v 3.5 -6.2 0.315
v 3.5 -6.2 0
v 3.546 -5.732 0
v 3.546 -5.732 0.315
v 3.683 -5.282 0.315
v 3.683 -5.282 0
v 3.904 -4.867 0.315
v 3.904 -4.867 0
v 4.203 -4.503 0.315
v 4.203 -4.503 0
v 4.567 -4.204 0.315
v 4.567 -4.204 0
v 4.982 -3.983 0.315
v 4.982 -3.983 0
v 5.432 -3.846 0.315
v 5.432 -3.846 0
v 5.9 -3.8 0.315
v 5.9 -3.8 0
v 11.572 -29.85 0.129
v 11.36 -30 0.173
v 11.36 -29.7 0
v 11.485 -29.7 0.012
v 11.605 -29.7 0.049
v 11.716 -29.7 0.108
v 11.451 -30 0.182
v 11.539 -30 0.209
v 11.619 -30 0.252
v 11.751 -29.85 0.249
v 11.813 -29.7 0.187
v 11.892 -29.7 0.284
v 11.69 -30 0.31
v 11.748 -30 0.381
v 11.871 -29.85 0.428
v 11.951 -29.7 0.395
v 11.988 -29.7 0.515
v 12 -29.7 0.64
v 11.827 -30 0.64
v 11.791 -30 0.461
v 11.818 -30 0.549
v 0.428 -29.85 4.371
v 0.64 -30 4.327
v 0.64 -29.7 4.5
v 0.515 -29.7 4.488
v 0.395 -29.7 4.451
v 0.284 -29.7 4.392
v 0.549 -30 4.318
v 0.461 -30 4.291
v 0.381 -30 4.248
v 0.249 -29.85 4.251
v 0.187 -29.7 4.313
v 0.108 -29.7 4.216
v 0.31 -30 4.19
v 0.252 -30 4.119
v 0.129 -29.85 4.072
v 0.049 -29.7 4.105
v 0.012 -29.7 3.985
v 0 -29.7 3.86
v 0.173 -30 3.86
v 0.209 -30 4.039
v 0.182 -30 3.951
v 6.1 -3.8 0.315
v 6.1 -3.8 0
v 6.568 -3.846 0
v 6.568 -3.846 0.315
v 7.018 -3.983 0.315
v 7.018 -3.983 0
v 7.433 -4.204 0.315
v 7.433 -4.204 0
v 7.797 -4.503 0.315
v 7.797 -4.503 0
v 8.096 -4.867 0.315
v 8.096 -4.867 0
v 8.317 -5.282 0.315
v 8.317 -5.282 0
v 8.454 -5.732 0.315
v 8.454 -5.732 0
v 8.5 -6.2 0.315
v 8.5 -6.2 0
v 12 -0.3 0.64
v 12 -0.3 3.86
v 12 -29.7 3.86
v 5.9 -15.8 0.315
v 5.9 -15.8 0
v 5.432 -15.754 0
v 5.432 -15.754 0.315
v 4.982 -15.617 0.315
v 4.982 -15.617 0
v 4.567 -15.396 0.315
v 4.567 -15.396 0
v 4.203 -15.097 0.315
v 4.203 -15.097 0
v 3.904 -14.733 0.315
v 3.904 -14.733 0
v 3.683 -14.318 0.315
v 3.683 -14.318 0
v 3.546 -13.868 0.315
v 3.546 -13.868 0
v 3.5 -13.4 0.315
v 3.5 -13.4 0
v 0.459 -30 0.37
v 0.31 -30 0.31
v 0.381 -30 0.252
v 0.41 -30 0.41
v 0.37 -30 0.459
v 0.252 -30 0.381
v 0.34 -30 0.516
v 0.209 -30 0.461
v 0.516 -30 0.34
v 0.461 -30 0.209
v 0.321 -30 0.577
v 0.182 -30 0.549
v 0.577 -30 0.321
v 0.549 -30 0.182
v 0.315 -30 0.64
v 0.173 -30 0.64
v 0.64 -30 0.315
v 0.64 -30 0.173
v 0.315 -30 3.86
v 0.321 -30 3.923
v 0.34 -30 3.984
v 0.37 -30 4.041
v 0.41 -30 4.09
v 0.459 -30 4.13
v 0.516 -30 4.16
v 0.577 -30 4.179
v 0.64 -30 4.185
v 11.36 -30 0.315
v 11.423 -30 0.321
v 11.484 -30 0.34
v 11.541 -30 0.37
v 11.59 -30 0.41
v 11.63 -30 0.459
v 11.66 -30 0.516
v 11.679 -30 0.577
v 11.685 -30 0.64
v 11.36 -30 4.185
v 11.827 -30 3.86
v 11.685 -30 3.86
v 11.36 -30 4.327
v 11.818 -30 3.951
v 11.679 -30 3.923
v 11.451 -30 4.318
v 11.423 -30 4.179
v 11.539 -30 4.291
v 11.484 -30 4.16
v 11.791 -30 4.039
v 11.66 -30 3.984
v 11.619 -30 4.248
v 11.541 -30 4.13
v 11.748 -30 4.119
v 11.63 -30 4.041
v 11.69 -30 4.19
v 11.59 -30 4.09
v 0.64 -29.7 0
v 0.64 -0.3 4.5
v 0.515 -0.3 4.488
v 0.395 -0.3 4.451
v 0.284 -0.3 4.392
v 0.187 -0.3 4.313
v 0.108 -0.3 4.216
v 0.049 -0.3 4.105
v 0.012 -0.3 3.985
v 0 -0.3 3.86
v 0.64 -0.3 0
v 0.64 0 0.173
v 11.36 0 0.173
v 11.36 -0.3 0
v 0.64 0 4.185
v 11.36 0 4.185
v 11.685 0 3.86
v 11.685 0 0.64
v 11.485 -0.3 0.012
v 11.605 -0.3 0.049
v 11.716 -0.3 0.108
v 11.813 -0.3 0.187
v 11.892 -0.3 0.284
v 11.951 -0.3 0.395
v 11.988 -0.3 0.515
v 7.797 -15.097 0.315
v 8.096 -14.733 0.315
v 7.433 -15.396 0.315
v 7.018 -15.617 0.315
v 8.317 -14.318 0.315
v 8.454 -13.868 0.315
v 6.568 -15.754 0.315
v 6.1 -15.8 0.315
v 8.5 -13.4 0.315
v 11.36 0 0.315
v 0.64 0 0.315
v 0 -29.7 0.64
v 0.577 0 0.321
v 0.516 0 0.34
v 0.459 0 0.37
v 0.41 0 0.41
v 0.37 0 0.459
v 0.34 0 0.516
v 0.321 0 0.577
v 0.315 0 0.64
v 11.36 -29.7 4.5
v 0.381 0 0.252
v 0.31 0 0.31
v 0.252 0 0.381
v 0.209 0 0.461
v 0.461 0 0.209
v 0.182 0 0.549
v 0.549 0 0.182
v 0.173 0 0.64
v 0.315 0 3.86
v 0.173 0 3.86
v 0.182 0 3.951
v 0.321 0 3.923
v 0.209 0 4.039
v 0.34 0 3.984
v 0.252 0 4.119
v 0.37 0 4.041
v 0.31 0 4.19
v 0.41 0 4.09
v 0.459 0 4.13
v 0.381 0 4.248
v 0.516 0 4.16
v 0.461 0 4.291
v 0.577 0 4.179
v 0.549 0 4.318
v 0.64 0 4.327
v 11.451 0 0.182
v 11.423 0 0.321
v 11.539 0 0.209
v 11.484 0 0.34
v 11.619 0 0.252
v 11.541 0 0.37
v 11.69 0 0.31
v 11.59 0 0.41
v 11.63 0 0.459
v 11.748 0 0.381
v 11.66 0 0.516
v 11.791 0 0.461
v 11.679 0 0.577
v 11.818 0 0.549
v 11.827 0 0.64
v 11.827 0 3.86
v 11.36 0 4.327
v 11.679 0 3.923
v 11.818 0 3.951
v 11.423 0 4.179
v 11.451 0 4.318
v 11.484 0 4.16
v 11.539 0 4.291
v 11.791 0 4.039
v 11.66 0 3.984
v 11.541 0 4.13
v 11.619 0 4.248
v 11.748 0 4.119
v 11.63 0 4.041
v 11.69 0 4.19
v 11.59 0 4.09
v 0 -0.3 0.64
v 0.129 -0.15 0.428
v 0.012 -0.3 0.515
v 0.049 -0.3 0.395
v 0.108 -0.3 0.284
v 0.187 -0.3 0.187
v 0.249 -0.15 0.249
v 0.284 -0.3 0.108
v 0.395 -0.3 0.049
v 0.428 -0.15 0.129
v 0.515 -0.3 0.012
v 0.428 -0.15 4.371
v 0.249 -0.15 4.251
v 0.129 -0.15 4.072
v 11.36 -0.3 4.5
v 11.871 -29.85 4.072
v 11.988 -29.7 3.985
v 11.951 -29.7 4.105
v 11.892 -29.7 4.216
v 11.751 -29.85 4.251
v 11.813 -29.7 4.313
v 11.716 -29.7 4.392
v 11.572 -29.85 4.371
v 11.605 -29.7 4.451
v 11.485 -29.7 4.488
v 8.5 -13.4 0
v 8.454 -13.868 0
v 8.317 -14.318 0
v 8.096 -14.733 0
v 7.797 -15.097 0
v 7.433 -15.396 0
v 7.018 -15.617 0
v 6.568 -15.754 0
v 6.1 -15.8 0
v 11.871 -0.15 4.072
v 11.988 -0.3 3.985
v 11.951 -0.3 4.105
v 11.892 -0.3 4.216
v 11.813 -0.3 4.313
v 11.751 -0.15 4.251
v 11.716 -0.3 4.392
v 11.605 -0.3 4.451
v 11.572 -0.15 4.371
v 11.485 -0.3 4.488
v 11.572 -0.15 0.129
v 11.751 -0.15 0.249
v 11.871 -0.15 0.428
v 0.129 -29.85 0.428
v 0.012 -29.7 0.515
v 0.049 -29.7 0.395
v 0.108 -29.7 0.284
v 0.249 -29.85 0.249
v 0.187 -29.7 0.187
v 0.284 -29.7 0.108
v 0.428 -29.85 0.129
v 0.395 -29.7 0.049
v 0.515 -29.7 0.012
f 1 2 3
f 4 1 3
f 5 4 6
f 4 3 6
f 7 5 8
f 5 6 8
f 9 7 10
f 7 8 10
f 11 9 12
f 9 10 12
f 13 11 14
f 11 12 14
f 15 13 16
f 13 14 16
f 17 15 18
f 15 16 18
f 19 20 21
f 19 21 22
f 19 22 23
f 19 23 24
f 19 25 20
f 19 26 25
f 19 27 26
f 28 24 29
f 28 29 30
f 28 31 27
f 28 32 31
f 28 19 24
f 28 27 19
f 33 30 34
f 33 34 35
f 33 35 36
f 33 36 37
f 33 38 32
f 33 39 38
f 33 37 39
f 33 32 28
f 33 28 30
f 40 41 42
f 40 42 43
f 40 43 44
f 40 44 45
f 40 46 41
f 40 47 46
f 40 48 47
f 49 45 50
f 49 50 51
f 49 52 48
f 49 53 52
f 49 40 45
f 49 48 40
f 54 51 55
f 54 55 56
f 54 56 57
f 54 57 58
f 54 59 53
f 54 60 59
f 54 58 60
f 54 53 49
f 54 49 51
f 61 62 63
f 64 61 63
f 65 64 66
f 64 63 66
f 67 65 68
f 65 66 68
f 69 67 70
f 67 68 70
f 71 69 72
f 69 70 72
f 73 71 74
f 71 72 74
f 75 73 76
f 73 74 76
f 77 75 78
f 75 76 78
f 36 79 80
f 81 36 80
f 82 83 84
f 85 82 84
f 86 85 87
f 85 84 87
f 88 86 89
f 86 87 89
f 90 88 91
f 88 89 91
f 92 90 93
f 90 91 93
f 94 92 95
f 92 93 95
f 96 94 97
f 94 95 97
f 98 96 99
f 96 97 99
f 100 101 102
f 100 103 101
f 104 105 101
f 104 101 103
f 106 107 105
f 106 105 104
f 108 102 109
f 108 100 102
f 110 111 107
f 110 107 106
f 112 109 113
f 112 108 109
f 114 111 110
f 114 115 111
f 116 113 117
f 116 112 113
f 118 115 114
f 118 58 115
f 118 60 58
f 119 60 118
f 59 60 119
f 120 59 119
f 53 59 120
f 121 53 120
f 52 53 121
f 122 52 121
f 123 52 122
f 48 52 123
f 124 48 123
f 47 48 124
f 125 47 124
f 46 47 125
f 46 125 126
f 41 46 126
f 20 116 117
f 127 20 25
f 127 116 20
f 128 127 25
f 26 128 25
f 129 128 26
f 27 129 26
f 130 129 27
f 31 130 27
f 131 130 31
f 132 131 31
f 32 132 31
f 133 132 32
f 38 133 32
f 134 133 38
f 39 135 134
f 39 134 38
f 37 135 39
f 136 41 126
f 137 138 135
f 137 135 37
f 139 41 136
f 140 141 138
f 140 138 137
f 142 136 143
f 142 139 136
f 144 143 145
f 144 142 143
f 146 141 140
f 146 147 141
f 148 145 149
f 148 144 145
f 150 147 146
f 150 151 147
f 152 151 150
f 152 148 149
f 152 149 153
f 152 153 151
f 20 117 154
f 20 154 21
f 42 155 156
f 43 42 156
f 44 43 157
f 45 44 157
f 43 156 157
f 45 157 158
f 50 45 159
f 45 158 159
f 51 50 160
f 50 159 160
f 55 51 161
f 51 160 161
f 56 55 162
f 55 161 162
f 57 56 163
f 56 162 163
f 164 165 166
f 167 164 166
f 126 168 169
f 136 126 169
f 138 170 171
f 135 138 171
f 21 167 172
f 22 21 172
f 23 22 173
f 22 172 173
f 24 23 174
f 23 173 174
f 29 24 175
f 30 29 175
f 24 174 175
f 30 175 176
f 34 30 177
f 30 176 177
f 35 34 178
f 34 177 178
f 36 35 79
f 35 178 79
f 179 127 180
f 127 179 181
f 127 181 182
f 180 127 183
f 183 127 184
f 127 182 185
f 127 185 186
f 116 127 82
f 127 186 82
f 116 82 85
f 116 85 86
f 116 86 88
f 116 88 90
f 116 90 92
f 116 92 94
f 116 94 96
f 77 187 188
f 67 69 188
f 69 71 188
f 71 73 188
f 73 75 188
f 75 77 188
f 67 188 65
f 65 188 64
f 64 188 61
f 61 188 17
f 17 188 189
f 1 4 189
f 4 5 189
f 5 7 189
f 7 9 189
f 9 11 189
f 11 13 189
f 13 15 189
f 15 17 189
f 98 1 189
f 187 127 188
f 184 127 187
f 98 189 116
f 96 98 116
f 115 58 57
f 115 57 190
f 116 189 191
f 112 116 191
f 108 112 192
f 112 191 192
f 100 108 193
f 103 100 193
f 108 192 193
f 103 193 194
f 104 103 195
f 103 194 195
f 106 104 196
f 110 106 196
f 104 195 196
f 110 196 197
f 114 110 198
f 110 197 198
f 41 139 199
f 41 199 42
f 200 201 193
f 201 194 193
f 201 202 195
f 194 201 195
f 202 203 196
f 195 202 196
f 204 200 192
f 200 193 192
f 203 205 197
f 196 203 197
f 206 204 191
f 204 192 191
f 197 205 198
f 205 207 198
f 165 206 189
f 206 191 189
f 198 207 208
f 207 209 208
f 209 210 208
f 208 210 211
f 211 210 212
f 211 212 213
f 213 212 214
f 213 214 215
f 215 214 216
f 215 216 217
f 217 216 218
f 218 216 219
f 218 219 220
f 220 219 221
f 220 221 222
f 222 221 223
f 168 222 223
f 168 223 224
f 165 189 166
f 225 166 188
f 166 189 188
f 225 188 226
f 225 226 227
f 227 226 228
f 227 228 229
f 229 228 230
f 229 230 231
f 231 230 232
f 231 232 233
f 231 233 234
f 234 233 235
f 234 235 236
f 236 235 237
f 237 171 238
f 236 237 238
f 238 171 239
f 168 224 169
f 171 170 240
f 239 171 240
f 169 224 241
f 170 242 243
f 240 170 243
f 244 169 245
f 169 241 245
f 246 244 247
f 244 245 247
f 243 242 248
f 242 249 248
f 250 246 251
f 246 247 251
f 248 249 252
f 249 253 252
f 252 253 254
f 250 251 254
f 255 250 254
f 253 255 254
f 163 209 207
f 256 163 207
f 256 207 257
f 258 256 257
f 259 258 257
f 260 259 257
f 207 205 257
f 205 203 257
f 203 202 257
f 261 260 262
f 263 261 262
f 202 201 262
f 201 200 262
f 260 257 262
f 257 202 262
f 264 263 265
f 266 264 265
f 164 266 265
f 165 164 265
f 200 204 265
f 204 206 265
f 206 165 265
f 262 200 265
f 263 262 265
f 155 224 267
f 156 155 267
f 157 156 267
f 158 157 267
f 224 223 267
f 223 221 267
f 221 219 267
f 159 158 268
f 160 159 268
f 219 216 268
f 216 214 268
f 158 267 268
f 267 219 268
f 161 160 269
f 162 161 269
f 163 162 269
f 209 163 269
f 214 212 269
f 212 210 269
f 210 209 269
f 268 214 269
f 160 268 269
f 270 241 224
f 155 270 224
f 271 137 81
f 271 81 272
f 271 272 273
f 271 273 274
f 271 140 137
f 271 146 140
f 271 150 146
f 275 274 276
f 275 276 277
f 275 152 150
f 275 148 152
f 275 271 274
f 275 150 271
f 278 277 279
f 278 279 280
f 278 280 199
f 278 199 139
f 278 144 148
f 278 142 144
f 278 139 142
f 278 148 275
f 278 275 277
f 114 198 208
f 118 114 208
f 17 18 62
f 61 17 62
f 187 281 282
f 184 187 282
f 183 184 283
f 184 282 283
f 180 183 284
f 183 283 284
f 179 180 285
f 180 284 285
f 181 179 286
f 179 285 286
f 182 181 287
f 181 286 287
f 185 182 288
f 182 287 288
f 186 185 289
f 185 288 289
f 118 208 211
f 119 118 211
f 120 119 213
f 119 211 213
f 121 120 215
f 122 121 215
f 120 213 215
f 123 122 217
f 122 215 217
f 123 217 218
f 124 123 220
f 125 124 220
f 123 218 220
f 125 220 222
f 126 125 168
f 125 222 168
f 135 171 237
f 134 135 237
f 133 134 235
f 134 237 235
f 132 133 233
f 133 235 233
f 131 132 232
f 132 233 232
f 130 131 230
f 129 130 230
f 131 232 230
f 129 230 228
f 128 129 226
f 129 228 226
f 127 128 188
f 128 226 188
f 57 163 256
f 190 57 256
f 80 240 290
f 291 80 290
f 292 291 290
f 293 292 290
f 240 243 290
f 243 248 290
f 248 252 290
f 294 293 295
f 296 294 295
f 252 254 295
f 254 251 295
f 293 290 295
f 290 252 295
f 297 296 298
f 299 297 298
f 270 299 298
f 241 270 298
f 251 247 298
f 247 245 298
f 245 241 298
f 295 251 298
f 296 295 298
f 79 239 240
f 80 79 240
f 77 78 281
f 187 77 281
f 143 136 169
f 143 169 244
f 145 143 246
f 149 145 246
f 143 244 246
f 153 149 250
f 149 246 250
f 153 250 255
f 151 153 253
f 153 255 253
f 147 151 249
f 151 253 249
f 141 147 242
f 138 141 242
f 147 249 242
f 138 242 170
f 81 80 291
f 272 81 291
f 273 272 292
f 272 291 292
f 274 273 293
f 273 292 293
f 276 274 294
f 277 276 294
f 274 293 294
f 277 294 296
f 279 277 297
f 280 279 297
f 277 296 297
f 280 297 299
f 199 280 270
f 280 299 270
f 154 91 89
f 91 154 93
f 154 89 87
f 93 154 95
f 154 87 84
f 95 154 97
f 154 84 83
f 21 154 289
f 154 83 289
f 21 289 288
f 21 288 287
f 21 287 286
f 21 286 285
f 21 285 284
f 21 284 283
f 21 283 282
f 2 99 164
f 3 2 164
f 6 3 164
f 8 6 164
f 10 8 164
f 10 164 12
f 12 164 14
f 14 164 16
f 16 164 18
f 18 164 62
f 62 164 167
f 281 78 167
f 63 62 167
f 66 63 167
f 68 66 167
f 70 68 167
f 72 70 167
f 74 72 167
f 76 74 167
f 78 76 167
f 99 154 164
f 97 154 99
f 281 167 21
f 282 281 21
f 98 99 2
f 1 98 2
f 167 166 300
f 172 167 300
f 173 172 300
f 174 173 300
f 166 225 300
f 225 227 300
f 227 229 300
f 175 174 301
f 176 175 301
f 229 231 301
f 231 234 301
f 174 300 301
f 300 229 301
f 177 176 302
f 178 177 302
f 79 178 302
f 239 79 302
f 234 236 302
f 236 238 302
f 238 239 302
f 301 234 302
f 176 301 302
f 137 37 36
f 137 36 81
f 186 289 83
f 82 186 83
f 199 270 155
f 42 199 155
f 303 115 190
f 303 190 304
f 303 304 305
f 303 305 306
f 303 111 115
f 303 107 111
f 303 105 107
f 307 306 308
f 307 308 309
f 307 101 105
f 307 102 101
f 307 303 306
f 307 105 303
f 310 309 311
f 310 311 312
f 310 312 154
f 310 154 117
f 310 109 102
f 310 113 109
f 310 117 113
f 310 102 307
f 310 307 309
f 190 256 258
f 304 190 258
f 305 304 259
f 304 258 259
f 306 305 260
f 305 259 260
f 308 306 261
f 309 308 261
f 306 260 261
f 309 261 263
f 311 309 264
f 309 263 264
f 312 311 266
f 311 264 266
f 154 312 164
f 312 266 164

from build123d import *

# Parameters (mm, degrees)
F1_DEPTH = 30
F3_DEPTH = 0.315
F4_SIZE2 = 0.173205
F4_SIZE  = 0.3


with BuildPart() as f1:
    # F0 (on Front) → F1 (new body)
    with BuildSketch(Plane.XZ):
        with BuildLine():
            ThreePointArc((0, 0.64), (0.187452, 0.187452), (0.64, 0))
            Line((0.64, 0), (11.36, 0))
            ThreePointArc((11.36, 0), (11.812548, 0.187452), (12, 0.64))
            Line((12, 0.64), (12, 3.86))
            ThreePointArc((12, 3.86), (11.812548, 4.312548), (11.36, 4.5))
            Line((11.36, 4.5), (0.64, 4.5))
            ThreePointArc((0.64, 4.5), (0.187452, 4.312548), (0, 3.86))
            Line((0, 3.86), (0, 0.64))
        make_face()
        with BuildLine():
            ThreePointArc((0.315, 3.86), (0.41019, 4.08981), (0.64, 4.185))
            Line((0.64, 4.185), (11.36, 4.185))
            ThreePointArc((11.36, 4.185), (11.58981, 4.08981), (11.685, 3.86))
            Line((11.685, 3.86), (11.685, 0.64))
            ThreePointArc((11.685, 0.64), (11.58981, 0.41019), (11.36, 0.315))
            Line((11.36, 0.315), (0.64, 0.315))
            ThreePointArc((0.64, 0.315), (0.41019, 0.41019), (0.315, 0.64))
            Line((0.315, 0.64), (0.315, 3.86))
        make_face(mode=Mode.SUBTRACT)
    extrude(amount=F1_DEPTH)

    # F2 (on face) → F3 (cut, through all)
    with BuildSketch(Plane(origin=(0, 0, 0), x_dir=(1, 0, 0), z_dir=(0, 0, -1))):
        with BuildLine():
            ThreePointArc((8.5, 13.4), (7.797056, 15.097056), (6.1, 15.8))
            Line((6.1, 15.8), (5.9, 15.8))
            ThreePointArc((5.9, 15.8), (4.202944, 15.097056), (3.5, 13.4))
            Line((3.5, 13.4), (3.5, 6.2))
            ThreePointArc((3.5, 6.2), (4.202944, 4.502944), (5.9, 3.8))
            Line((5.9, 3.8), (6.1, 3.8))
            ThreePointArc((6.1, 3.8), (7.797056, 4.502944), (8.5, 6.2))
            Line((8.5, 6.2), (8.5, 13.4))
        make_face()
    extrude(amount=-F3_DEPTH, mode=Mode.SUBTRACT)

    # F4
    f4_edges = [f1.edges().sort_by_distance(p)[0] for p in [
        (6, 0, 0),
        (6, -30, 0),
    ]]
    chamfer(f4_edges, length=F4_SIZE, length2=F4_SIZE2)


solid = f1.part
